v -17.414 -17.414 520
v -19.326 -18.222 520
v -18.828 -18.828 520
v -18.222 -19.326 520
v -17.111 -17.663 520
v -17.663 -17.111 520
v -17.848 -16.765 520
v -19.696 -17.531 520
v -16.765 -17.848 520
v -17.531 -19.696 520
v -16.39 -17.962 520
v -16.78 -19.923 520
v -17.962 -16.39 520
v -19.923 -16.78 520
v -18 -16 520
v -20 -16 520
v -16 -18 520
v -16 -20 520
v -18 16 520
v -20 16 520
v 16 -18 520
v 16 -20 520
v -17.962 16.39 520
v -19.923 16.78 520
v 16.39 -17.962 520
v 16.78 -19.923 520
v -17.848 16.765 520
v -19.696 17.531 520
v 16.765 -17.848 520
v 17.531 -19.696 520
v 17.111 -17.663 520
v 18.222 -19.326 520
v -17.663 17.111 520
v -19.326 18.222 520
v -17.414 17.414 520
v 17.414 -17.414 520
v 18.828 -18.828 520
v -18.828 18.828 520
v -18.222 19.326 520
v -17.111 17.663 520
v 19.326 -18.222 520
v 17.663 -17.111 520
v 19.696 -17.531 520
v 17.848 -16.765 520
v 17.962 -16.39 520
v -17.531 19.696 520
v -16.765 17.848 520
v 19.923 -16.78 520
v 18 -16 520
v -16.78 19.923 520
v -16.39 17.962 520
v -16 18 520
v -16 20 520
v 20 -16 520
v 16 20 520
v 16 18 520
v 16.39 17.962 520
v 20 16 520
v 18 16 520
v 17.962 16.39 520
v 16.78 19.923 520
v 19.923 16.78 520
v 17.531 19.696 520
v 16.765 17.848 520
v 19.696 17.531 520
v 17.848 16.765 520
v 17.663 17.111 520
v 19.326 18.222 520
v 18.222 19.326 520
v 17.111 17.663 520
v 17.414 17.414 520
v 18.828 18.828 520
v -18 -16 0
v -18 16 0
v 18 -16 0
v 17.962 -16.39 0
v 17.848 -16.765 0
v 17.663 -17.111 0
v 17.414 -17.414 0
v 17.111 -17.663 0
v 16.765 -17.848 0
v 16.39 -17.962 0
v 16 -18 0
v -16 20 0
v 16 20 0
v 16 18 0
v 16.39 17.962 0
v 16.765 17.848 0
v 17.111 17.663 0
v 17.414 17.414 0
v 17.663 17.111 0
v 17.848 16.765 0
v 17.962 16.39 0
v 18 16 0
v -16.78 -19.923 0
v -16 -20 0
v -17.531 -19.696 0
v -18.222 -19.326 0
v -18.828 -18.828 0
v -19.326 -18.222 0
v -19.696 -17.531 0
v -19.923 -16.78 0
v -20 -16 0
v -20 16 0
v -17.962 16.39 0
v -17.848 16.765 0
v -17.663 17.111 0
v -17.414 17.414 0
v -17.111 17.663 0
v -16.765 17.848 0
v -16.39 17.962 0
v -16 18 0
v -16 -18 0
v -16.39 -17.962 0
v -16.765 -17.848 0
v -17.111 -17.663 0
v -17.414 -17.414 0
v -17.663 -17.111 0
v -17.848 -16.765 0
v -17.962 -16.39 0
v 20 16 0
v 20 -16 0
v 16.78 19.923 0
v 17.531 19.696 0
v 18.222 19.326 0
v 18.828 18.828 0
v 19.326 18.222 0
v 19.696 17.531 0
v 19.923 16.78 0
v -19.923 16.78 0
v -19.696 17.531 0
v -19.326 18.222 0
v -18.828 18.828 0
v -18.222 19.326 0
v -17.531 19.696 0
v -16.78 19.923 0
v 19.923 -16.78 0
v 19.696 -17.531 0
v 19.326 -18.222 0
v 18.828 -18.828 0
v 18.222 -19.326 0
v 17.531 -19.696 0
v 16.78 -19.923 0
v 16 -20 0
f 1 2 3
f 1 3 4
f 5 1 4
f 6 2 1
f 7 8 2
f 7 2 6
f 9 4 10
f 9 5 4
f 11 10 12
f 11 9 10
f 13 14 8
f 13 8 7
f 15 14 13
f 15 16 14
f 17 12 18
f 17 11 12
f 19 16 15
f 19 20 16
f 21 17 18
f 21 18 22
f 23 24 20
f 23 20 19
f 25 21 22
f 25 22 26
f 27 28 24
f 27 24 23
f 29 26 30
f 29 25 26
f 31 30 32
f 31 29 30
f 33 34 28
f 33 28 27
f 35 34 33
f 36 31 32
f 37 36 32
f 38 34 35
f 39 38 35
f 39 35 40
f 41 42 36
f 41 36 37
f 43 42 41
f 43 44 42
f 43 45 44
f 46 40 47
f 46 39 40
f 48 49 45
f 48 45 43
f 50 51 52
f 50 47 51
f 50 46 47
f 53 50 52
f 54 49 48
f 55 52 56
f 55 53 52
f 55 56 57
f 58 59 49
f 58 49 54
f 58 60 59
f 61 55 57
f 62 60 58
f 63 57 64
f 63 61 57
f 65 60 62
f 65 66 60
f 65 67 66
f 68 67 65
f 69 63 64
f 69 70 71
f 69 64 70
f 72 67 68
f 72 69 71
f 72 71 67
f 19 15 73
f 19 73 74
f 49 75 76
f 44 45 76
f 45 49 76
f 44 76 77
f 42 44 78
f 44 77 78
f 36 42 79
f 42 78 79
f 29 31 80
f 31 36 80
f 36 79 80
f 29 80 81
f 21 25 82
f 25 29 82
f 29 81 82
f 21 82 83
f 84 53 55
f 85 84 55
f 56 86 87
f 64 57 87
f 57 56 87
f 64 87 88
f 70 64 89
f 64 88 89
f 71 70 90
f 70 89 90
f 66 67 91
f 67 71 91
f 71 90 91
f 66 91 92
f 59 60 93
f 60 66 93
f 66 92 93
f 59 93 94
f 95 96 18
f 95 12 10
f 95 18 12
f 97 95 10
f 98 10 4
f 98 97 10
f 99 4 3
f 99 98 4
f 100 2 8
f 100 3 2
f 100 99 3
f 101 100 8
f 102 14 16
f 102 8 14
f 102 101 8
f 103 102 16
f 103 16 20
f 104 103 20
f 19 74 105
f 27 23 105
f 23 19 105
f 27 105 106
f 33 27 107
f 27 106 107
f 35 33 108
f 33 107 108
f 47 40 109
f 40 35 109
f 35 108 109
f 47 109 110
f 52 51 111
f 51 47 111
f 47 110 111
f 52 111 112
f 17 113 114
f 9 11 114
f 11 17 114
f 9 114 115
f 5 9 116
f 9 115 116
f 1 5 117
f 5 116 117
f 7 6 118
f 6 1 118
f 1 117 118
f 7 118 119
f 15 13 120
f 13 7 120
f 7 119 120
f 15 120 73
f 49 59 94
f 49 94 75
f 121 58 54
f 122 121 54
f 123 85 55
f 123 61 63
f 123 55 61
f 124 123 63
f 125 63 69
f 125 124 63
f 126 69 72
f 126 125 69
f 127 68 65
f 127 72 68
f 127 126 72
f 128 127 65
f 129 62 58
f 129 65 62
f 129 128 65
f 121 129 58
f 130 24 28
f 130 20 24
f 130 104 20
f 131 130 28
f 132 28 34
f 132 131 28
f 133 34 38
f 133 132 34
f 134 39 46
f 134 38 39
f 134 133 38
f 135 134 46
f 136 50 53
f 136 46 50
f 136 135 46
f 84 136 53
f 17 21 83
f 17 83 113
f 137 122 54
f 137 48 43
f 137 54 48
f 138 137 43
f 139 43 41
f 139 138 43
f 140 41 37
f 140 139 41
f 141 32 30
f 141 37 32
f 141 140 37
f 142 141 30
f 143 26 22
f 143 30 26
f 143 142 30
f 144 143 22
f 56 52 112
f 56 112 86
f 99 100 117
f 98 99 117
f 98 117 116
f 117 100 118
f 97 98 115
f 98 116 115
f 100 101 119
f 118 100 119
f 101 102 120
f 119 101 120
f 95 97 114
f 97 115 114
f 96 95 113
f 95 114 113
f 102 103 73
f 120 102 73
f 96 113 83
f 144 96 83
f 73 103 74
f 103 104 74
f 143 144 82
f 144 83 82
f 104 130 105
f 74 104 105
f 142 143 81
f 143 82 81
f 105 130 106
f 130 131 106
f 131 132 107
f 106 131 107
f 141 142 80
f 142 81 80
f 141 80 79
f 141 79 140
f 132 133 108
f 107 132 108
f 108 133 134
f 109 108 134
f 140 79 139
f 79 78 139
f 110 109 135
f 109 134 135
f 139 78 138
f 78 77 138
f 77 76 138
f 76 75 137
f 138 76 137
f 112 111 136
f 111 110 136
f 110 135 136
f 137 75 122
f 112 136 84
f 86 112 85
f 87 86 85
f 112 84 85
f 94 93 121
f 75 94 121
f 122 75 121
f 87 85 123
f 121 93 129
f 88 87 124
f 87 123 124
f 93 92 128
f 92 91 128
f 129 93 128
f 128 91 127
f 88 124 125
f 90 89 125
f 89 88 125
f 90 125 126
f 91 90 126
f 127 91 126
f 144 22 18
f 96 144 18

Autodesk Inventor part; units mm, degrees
ref_plane "YZ Plane" through (0, 0, 0) normal (1, 0, 0) x (0, 1, 0)
ref_plane "Start Plane" through (0, 0, 0) normal (0, 0, 1) x (1, 0, 0)
ref_plane "End Plane" through (0, 0, 520) normal (0, 0, 1) x (1, 0, 0)
sketch "Sketch" plane through (0, 0, 0) normal (0, 0, 1) x (1, 0, 0)
  line L0 (-20, -16) -> (-20, 16)
  line L1 (-16, 20) -> (16, 20)
  line L2 (20, 16) -> (20, -16)
  line L3 (16, -20) -> (-16, -20)
  arc A0 (-20, -16) -> (-16, -20) centre (-16, -16) ccw
  arc A1 (20, 16) -> (16, 20) centre (16, 16) ccw
  arc A2 (-16, 20) -> (-20, 16) centre (-16, 16) ccw
  arc A3 (16, -20) -> (20, -16) centre (16, -16) ccw
  arc A4 (-16, 18) -> (-18, 16) centre (-16, 16) ccw
  line L4 (-16, 18) -> (16, 18)
  arc A5 (18, 16) -> (16, 18) centre (16, 16) ccw
  line L5 (18, 16) -> (18, -16)
  arc A6 (16, -18) -> (18, -16) centre (16, -16) ccw
  line L6 (16, -18) -> (-16, -18)
  arc A7 (-18, -16) -> (-16, -18) centre (-16, -16) ccw
  line L7 (-18, -16) -> (-18, 16)
  line L8 (0, 29.1598) -> (0, -29.1598) construction
  line L9 (-29.1598, 0) -> (29.1598, 0) construction
  dimension "d7" = 4
  dimension "d9" = 40
  dimension "d11" = 40
  dimension "d12" = 2
  dimension "d15" = 20
  dimension "d16" = 20
extrude "Body" add sketch "Sketch" along normal up to surface (520 mm away) from surface at 0
sketch "Sketch3" plane through (0, 0, 0) normal (0, 0, 1) x (1, 0, 0)
  line L0 (0, 0) -> (10, 0)
ref_plane "Work Plane3" through (0, 0, 0) normal (0, -1, 0) x (1, 0, 0)
sketch "Sketch4" plane through (0, 0, 0) normal (0, -1, 0) x (1, 0, 0)
  line L0 (-2, 0) -> (12, 0) projected
  line L1 (-2, 520) -> (12, 520) projected
  dimension "d18" = 520
equation "\"d7\" = G_IR"
equation "\"d9\" = G_W"
equation "\"d11\" = G_H"
equation "\"d12\" = G_T"
equation "\"d15\" = 0.5 * d9"
equation "\"d16\" = 0.5 * d11"
equation "\"d3\" = G_L"
equation "\"G_W\" = 40"
equation "\"G_H\" = 40"
equation "\"G_T\" = 2"
equation "\"G_IR\" = 4"
equation "\"G_L\" = d18"
equation "\"G_OFFSET_START\" = 0"
equation "\"G_OFFSET_END\" = -6"
equation "\"B_L\" = 526"
properties part number "ISO 10799-2 - 40x40x2 - 520" material "Stainless Steel"
